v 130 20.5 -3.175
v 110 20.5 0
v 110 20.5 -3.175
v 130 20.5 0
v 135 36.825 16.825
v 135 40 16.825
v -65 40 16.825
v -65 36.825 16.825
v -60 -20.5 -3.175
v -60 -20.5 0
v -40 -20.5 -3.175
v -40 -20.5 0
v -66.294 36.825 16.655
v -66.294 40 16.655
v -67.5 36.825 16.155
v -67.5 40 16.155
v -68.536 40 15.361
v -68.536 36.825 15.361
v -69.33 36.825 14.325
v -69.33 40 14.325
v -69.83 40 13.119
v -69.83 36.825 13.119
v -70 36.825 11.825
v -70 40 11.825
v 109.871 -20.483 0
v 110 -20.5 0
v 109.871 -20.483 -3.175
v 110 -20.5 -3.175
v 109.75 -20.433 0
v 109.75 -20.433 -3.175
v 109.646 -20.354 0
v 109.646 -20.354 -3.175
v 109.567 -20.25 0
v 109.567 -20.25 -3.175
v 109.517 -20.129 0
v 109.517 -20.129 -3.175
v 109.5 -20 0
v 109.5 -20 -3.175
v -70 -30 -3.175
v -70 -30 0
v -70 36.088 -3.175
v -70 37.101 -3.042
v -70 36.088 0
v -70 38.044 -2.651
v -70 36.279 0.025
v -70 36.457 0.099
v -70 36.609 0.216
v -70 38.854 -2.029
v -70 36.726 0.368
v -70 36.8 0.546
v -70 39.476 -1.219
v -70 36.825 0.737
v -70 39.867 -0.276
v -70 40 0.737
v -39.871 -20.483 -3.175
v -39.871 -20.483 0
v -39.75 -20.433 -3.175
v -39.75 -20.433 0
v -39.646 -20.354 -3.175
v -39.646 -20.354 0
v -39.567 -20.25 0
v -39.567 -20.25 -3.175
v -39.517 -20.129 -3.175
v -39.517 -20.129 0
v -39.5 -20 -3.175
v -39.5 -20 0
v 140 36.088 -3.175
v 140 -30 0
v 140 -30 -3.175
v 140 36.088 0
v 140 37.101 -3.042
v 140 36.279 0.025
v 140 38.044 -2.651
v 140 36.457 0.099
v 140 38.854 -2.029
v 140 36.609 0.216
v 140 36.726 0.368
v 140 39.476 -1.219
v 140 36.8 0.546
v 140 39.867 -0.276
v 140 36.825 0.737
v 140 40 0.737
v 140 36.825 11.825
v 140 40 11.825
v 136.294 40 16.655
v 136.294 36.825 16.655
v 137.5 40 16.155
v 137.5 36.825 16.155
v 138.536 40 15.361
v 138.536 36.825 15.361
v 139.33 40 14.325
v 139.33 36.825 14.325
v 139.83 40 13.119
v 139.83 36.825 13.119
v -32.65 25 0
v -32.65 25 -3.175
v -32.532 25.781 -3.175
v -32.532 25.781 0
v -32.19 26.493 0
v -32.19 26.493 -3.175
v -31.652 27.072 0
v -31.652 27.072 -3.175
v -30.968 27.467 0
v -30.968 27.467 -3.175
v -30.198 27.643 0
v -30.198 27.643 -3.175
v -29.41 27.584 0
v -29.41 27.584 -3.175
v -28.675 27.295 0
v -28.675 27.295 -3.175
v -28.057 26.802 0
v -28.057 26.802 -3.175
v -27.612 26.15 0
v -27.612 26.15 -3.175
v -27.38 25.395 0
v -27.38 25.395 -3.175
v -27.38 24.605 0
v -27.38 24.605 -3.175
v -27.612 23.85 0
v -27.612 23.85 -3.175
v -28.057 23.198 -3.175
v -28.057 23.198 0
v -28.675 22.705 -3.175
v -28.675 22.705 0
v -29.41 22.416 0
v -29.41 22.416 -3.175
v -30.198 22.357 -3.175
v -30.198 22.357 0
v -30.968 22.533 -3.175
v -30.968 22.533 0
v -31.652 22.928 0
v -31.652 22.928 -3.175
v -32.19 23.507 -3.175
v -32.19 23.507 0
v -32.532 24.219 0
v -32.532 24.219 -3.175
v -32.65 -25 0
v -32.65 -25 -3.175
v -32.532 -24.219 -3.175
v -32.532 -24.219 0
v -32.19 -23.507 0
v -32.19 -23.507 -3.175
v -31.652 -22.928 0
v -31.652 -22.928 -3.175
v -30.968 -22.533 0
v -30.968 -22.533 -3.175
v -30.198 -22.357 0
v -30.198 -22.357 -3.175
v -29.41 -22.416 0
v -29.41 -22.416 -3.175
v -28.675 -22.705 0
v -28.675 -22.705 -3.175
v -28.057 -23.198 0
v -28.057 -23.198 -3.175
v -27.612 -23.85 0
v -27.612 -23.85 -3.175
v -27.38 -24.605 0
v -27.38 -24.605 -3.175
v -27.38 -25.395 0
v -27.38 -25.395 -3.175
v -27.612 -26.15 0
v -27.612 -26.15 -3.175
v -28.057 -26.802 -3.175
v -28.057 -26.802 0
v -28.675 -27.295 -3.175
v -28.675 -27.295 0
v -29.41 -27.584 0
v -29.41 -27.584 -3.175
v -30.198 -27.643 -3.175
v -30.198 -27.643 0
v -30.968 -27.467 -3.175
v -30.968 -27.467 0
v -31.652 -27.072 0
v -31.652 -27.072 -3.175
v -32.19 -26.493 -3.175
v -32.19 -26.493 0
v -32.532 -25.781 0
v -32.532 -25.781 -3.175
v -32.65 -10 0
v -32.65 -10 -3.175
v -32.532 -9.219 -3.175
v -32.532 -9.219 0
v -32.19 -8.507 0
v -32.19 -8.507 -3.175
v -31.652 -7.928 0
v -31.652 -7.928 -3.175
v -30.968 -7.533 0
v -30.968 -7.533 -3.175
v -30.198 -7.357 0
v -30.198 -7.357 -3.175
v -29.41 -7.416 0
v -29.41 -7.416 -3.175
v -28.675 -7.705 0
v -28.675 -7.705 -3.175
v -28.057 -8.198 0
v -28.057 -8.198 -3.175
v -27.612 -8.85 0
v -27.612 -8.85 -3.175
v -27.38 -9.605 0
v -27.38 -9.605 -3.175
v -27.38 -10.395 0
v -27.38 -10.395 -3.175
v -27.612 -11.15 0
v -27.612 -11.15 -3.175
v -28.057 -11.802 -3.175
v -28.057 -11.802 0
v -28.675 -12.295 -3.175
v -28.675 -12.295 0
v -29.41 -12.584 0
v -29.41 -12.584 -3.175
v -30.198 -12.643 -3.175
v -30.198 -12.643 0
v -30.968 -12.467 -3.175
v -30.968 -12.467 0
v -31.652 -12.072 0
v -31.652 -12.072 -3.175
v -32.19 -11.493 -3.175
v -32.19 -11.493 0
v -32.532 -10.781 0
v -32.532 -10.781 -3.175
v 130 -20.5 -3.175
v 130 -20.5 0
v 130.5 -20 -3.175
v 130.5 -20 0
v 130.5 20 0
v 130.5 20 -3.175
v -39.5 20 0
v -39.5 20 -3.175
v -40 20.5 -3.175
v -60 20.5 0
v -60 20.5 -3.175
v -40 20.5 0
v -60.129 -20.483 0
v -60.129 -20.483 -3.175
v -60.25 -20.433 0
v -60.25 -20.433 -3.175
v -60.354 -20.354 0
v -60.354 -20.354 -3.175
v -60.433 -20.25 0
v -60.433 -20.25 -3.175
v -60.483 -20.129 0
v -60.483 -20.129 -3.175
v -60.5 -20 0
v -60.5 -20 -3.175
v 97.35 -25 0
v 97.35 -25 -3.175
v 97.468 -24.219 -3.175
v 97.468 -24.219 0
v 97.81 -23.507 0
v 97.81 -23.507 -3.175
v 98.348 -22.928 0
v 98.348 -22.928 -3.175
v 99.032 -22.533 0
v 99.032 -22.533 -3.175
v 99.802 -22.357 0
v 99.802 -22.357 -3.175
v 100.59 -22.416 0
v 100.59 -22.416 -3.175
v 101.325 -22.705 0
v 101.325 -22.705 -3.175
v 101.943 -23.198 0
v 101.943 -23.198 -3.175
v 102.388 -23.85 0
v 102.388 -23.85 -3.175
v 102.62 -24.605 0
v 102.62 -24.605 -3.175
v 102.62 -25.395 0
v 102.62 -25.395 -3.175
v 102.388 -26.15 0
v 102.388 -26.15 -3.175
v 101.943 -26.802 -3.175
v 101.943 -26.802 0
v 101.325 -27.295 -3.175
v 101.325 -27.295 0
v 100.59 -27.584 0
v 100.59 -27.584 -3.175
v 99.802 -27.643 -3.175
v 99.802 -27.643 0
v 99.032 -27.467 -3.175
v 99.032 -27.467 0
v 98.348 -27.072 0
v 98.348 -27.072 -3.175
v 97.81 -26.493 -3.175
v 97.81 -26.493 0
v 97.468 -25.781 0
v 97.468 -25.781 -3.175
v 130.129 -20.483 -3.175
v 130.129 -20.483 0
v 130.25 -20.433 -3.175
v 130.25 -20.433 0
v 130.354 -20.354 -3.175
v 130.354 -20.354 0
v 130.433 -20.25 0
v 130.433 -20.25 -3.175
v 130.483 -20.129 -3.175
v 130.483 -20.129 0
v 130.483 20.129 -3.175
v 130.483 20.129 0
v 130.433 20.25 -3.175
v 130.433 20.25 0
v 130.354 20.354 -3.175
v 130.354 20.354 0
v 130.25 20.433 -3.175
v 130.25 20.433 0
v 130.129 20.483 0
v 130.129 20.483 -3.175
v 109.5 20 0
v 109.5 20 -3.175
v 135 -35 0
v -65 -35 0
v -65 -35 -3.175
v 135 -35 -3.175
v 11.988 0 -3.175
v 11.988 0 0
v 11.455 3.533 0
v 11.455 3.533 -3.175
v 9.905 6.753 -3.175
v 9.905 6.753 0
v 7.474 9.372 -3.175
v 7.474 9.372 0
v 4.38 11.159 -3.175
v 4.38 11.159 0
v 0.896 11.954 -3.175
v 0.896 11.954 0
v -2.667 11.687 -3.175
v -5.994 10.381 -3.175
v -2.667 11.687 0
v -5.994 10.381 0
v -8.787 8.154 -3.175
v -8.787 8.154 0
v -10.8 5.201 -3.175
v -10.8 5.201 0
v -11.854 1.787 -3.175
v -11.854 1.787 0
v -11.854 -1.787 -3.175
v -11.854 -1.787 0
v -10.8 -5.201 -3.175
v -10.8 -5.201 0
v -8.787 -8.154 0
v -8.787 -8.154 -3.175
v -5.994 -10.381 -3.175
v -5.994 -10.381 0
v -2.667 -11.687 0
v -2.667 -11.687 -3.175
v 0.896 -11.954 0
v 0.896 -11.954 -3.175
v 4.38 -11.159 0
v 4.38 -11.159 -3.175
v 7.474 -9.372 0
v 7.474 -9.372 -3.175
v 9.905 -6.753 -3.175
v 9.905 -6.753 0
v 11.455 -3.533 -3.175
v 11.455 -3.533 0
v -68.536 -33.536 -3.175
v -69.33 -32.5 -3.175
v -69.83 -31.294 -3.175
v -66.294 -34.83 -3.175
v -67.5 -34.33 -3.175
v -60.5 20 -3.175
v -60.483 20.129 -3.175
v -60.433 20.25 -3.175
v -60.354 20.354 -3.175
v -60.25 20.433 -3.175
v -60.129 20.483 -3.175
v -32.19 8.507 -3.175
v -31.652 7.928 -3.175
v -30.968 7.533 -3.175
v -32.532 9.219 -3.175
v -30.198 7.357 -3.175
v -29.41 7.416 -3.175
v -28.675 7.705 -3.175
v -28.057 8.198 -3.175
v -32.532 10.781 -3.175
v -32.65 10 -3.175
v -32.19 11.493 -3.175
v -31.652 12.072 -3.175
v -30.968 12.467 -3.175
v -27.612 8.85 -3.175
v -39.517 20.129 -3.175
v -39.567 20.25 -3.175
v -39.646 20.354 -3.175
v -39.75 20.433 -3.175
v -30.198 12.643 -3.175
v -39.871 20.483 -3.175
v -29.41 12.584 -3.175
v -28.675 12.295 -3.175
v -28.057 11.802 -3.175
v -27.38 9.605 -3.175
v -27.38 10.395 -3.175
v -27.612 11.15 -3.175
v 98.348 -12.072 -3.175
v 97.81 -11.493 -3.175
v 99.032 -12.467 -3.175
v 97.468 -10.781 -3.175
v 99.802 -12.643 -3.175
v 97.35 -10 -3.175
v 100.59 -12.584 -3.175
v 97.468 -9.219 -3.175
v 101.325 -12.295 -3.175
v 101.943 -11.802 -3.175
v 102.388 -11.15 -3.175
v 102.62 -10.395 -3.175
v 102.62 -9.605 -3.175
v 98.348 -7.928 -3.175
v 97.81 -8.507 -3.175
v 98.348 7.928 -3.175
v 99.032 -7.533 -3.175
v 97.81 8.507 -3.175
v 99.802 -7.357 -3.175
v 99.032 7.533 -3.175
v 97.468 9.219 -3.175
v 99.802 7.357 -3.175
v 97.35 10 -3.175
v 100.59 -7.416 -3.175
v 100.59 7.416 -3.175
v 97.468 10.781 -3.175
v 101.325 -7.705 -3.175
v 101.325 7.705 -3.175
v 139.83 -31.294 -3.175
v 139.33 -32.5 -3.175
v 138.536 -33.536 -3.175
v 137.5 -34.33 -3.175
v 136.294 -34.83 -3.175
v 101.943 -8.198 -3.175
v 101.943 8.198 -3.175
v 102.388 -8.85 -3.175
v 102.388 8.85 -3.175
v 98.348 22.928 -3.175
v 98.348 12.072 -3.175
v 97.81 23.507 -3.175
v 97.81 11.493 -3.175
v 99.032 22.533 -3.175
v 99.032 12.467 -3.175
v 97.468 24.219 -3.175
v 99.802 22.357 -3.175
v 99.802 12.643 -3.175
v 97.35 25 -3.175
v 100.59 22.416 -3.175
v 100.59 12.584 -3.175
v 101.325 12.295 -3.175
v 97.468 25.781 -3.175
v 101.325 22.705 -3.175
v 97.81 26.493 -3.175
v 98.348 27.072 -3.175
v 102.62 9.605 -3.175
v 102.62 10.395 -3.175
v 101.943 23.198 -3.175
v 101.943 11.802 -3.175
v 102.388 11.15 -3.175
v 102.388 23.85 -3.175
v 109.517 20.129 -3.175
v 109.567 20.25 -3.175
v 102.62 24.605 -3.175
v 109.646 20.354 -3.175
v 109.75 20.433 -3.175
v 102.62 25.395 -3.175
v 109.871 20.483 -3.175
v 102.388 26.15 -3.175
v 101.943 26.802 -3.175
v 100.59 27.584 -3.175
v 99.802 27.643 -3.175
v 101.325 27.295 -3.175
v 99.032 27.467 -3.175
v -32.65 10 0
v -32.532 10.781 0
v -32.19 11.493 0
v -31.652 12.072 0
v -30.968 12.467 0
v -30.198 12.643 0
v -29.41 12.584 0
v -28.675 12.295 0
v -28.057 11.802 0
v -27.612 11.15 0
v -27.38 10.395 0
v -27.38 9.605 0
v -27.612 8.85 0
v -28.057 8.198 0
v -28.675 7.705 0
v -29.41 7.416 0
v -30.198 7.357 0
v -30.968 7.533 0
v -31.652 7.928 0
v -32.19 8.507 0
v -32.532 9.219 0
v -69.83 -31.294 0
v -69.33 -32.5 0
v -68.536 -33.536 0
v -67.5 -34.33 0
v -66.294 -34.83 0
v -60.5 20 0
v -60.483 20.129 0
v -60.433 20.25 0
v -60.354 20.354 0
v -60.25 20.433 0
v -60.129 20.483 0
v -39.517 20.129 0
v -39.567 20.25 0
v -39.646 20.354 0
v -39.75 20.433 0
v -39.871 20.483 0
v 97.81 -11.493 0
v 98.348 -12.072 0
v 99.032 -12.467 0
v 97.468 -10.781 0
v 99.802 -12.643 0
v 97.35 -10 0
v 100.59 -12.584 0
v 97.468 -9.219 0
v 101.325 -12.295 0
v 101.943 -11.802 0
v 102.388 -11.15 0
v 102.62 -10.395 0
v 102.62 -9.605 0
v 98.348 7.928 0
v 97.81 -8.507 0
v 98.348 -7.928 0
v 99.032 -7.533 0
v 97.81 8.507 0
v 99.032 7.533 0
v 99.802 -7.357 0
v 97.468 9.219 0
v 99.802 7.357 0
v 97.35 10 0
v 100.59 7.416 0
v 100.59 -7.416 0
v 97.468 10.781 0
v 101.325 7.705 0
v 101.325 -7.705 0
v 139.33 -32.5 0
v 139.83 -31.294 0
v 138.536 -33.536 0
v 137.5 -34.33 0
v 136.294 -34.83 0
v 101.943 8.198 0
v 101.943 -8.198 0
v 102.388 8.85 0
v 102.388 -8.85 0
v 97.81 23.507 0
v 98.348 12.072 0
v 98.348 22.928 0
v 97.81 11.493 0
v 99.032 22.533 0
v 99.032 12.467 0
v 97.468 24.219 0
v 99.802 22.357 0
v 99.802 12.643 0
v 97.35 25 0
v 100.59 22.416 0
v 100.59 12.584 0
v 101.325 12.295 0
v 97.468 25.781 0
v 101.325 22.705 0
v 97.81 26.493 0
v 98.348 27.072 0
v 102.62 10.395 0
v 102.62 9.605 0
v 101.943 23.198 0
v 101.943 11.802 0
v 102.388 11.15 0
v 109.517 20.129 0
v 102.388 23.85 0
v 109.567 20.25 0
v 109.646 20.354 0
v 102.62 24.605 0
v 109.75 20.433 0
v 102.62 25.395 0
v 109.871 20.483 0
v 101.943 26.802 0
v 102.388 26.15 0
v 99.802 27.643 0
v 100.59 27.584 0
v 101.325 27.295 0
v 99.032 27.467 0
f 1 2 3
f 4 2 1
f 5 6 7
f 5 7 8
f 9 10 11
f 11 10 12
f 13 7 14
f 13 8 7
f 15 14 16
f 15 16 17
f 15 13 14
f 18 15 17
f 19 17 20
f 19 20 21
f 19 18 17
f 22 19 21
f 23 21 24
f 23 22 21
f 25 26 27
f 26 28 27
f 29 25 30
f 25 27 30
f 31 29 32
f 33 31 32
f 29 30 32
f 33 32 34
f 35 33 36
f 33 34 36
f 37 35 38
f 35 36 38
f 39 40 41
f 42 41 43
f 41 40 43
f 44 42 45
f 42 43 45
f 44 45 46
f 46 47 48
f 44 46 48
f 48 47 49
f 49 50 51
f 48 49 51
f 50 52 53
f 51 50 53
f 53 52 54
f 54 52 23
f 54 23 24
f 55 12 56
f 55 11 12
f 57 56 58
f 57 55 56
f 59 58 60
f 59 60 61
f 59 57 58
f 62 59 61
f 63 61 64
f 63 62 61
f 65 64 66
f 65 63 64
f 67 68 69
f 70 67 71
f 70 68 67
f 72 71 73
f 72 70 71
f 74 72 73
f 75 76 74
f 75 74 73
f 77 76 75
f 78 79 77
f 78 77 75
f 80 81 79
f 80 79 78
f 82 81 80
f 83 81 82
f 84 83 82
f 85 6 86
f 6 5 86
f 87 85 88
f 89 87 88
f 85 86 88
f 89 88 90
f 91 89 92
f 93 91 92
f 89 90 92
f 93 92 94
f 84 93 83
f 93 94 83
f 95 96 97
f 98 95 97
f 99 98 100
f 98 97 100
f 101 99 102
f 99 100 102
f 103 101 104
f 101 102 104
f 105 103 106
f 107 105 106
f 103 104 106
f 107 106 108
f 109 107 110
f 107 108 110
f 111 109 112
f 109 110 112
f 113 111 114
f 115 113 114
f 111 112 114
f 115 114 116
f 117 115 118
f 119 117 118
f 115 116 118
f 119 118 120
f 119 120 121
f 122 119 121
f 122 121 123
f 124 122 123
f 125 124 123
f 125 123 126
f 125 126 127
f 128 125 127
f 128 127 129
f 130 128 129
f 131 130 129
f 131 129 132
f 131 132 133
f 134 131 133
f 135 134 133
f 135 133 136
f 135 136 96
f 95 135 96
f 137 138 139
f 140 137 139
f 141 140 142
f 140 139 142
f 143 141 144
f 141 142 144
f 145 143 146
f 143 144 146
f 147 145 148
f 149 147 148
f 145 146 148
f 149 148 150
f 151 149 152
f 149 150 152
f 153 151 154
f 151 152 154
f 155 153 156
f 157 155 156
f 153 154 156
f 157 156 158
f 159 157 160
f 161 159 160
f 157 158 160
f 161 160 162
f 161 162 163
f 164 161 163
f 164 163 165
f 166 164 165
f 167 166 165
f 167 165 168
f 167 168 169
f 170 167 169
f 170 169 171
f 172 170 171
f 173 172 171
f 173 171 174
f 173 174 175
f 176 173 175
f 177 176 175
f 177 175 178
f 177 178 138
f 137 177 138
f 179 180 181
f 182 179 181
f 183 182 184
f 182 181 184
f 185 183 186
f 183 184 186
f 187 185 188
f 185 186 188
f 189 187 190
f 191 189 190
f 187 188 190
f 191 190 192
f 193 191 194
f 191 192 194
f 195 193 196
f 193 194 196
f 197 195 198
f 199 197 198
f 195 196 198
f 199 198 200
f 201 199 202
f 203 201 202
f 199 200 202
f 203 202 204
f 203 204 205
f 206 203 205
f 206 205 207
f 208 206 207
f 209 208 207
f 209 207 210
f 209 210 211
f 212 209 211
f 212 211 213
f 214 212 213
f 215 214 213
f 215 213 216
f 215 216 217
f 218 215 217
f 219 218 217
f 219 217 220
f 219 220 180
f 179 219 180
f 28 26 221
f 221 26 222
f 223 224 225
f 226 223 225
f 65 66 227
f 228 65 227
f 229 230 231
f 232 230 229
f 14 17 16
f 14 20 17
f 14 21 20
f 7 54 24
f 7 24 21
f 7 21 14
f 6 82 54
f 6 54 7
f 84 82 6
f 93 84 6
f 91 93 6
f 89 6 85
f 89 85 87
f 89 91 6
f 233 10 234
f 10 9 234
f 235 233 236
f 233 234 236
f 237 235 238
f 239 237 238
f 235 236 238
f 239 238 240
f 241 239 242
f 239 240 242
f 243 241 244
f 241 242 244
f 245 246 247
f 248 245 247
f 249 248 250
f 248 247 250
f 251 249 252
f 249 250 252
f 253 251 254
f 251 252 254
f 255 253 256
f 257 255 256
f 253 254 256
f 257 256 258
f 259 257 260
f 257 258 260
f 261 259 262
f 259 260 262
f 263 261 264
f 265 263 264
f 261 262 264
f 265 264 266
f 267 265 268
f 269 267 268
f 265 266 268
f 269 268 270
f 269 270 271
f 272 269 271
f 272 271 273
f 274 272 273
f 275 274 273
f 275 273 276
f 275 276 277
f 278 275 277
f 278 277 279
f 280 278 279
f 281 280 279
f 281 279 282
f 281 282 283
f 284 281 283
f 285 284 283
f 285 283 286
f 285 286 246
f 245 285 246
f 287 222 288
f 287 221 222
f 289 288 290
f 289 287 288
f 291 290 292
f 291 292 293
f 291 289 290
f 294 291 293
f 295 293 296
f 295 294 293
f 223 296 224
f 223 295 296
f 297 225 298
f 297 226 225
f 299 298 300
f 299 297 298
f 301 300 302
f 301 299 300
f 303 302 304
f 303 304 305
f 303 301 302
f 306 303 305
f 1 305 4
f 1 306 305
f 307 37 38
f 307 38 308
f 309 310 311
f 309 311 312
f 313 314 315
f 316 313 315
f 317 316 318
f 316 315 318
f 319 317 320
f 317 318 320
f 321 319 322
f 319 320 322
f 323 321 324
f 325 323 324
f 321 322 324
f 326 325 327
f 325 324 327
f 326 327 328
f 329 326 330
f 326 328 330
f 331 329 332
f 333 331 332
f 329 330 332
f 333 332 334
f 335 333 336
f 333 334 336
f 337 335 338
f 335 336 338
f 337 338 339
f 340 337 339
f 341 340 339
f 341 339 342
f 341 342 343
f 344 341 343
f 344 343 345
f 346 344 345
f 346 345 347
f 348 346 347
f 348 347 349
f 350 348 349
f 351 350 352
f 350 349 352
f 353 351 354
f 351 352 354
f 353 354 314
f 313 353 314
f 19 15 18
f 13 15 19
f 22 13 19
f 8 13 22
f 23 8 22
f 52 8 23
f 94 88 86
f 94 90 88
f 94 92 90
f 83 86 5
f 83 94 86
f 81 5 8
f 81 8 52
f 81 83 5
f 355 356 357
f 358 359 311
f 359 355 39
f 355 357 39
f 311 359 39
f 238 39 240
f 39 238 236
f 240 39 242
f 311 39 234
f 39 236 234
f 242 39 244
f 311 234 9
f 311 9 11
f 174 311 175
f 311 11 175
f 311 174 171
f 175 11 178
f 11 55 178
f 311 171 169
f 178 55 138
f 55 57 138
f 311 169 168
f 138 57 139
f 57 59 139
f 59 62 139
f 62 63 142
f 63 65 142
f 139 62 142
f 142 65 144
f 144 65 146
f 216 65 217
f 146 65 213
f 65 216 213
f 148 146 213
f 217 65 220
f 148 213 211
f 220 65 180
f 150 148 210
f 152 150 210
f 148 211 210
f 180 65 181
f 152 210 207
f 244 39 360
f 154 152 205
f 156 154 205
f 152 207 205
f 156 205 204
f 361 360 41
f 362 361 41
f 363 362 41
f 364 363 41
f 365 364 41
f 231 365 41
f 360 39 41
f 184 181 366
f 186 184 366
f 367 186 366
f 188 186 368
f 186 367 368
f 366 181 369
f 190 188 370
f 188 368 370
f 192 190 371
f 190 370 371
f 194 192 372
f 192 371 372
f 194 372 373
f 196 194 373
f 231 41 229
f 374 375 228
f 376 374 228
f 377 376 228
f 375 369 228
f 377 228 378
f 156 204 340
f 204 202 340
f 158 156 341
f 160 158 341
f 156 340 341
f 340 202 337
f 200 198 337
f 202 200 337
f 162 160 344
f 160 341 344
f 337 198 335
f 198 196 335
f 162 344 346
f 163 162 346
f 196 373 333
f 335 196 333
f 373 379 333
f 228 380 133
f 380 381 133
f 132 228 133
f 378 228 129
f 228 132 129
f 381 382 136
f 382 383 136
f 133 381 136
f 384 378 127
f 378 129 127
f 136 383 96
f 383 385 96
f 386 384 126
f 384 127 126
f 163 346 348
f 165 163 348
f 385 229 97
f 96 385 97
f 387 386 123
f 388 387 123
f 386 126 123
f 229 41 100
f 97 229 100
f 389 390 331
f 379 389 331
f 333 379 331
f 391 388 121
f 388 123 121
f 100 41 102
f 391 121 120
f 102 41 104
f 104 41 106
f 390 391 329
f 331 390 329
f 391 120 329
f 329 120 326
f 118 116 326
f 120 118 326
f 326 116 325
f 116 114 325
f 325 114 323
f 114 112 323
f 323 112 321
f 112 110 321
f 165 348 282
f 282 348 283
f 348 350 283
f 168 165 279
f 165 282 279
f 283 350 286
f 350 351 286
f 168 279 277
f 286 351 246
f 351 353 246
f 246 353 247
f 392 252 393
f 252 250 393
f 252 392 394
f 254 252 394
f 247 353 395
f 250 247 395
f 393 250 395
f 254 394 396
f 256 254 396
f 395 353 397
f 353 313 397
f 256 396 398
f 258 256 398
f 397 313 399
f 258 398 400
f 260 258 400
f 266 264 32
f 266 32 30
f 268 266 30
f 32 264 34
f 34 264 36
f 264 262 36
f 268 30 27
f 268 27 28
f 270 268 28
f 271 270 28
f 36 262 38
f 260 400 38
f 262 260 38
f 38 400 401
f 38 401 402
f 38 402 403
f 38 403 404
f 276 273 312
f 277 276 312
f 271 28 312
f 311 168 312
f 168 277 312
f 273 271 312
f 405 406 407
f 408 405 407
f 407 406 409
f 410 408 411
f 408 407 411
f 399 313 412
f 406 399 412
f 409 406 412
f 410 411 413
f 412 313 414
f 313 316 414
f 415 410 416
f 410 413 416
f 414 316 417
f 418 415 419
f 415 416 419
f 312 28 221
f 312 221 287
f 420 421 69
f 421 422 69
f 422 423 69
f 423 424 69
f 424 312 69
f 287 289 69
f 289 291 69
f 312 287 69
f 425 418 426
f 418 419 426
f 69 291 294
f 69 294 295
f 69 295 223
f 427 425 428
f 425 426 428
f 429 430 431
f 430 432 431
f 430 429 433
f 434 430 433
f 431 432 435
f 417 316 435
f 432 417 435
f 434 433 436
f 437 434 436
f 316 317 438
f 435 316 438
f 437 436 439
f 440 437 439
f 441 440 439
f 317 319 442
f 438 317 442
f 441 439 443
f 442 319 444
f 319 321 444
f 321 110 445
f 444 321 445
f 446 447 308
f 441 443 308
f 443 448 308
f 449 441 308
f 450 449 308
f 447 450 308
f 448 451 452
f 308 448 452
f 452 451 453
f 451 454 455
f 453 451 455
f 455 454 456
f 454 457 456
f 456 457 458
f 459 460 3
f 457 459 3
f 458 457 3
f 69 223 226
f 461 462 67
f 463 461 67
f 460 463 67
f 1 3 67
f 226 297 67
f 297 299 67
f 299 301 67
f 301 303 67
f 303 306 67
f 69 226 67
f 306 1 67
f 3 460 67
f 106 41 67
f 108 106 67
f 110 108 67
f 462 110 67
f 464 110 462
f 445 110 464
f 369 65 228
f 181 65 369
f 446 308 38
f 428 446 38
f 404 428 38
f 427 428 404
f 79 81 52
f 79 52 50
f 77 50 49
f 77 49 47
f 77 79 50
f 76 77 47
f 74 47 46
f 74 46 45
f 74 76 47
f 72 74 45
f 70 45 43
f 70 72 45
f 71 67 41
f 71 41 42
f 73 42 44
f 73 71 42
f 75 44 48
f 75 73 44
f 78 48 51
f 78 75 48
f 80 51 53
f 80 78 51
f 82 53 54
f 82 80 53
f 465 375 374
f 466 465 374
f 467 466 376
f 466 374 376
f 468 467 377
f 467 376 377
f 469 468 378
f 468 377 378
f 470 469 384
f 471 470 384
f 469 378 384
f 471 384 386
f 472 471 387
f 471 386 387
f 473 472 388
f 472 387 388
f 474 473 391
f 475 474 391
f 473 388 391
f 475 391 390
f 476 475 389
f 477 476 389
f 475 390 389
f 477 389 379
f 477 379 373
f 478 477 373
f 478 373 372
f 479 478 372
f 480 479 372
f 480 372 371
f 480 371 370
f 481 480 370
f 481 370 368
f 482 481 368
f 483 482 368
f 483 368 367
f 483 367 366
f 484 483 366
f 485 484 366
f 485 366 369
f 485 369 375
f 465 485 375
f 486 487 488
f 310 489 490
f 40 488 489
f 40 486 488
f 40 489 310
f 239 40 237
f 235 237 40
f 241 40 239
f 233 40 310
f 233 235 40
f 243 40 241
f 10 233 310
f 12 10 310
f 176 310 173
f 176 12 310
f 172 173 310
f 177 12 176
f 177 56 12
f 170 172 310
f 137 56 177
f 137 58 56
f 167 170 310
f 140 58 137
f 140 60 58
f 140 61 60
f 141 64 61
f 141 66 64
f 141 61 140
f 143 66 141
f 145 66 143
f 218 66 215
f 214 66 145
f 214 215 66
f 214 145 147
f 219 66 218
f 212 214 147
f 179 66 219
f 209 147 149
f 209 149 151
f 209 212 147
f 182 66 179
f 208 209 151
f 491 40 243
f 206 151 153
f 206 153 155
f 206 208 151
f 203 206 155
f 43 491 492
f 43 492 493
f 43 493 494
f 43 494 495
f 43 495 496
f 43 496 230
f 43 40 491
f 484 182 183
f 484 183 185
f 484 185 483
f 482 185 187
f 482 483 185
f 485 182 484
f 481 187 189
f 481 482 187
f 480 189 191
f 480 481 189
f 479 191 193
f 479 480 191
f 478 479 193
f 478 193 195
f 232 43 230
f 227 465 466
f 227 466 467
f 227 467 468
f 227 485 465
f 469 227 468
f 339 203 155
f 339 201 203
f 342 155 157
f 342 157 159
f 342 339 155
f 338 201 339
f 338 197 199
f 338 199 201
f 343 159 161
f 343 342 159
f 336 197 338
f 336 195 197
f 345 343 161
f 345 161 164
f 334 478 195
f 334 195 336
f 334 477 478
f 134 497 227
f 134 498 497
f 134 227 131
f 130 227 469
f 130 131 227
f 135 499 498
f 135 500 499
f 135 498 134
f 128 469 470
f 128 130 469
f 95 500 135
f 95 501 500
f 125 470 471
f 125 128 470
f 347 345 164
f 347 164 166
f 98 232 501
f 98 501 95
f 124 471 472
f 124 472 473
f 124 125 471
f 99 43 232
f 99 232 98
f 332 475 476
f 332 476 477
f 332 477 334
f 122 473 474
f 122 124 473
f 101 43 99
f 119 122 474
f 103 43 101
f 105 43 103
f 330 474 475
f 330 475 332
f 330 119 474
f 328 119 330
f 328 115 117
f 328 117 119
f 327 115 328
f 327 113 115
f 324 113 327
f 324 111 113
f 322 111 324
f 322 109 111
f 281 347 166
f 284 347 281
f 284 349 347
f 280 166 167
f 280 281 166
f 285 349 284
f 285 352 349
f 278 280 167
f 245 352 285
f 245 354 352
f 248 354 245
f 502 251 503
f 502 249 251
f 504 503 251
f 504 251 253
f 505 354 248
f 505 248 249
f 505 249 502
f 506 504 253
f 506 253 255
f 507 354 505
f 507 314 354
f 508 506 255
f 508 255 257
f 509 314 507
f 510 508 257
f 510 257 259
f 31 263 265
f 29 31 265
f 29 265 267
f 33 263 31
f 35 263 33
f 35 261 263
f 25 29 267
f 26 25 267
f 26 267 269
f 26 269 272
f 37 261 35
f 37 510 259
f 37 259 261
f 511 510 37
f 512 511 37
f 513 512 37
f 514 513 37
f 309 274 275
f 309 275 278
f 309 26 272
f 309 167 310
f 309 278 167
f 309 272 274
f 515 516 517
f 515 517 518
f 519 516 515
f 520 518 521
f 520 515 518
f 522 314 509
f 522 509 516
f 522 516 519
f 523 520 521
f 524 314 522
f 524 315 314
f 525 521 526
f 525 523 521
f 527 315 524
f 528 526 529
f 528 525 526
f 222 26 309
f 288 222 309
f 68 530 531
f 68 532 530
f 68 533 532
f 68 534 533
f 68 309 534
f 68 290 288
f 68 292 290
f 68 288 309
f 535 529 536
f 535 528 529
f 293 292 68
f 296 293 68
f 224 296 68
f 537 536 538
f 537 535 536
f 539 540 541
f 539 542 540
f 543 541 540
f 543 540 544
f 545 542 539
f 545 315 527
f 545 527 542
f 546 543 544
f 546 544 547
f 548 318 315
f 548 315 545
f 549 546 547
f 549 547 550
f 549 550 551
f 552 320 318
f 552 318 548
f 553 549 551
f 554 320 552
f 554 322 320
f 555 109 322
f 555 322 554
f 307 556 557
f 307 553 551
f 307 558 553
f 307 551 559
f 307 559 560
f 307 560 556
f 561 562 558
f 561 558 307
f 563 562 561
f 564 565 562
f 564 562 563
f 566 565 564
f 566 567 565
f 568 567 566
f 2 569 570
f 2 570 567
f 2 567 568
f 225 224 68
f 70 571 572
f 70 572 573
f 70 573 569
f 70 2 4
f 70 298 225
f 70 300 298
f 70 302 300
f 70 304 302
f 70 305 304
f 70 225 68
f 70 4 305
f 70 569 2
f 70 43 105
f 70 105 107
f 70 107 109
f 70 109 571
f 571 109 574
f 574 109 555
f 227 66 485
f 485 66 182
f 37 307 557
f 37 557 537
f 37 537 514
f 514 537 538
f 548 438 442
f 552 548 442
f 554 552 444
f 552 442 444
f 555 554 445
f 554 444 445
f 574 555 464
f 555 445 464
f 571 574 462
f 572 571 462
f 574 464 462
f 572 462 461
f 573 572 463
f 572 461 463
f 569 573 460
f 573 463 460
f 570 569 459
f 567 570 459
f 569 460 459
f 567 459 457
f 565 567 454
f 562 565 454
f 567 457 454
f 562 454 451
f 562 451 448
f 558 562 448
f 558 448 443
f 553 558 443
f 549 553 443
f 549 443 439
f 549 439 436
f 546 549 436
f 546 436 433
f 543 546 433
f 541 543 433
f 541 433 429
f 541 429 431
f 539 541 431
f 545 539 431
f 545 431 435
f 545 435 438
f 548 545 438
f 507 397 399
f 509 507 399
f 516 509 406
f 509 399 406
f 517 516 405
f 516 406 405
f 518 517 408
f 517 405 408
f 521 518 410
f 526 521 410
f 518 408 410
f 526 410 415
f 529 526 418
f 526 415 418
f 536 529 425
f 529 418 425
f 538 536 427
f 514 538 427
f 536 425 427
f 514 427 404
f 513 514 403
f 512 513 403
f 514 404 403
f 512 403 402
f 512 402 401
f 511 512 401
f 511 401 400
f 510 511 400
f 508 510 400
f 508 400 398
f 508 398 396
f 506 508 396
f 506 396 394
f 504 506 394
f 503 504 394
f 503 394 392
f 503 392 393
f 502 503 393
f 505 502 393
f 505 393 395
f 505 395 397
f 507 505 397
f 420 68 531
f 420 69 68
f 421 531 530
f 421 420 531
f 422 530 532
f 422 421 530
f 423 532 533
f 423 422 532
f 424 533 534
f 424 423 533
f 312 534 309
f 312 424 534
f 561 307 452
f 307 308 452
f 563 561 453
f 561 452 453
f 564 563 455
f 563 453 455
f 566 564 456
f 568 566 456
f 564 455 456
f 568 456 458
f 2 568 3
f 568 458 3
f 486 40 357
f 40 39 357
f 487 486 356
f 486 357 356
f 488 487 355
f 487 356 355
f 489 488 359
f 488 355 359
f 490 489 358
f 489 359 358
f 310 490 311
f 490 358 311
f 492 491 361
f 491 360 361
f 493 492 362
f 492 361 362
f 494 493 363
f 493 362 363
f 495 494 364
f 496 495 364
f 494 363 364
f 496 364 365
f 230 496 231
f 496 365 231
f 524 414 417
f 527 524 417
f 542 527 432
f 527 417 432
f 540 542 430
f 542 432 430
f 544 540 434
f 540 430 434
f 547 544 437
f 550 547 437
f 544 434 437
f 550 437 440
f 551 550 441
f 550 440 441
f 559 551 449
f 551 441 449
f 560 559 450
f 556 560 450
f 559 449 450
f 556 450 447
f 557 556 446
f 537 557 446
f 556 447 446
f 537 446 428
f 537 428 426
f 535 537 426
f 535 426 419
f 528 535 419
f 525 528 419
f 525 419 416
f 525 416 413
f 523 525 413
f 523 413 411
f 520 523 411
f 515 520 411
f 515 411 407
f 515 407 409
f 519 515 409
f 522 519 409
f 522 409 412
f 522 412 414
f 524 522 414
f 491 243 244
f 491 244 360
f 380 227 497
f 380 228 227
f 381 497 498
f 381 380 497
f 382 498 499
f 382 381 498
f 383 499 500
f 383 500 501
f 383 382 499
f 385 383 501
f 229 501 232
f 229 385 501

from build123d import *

# Parameters (mm, degrees)
SKETCH1_W                    = 210
SKETCH1_H                    = 75
SKETCH1_R                    = 11.9875
SKETCH1_W_2                  = 21
SKETCH1_H_2                  = 41
BASE_FLANGE1_DEPTH           = 3.175
EDGE_FLANGE1_STRIP_W         = 14.1732
EDGE_FLANGE1_STRIP_H         = 3.175
EDGE_FLANGE1_STRIP_CUT_DEPTH = 210
EDGE_FLANGE1_DEPTH           = 210
M5_CLEARANCE_HOLE1_D         = 5.3
FILLET1_R                    = 5
FILLET2_R                    = 0.5


# Sheet-metal steps are written as plain solids
with BuildPart() as part:
    # Sketch1 → Base-Flange1 (new body)
    with BuildSketch(Plane.XY):
        with Locations((35, 2.5)):
            Rectangle(SKETCH1_W, SKETCH1_H)
        Circle(SKETCH1_R, mode=Mode.SUBTRACT)
        with Locations((-50, 0)):
            Rectangle(SKETCH1_W_2, SKETCH1_H_2, mode=Mode.SUBTRACT)
        with Locations((120, 0)):
            Rectangle(SKETCH1_W_2, SKETCH1_H_2, mode=Mode.SUBTRACT)
    extrude(amount=-BASE_FLANGE1_DEPTH)

    # Edge-Flange1 strip (across the edge) → Edge-Flange1 strip cut (cut)
    with BuildSketch(Plane(origin=(140, 40, 0), x_dir=(0, -1, 0), z_dir=(-1, 0, 0))):
        with Locations((-3.175, -1.5875)):
            Rectangle(EDGE_FLANGE1_STRIP_W, EDGE_FLANGE1_STRIP_H)
    extrude(amount=EDGE_FLANGE1_STRIP_CUT_DEPTH, mode=Mode.SUBTRACT)

    # Edge-Flange1 section (across the edge) → Edge-Flange1 (add)
    with BuildSketch(Plane(origin=(140, 40, 0), x_dir=(0, -1, 0), z_dir=(-1, 0, 0))):
        with BuildLine():
            Line((0, 0.7366), (0, 16.825))
            Line((0, 16.825), (3.175, 16.825))
            Line((3.175, 16.825), (3.175, 0.7366))
            ThreePointArc((3.175, 0.7366), (3.390745145, 0.215745145), (3.9116, 0))
            Line((3.9116, 0), (3.9116, -3.175))
            ThreePointArc((3.9116, -3.175), (1.145681115, -2.029318885), (0, 0.7366))
        make_face()
    extrude(amount=EDGE_FLANGE1_DEPTH)

    # M5 Clearance Hole1 (through all)
    with Locations(Plane(origin=(-30, 25, 0), x_dir=(1, 0, 0), z_dir=(0, 0, 1))):
        with Locations((0, 0), (0, -50), (130, -50), (130, 0), (0, -15), (0, -35), (130, -35), (130, -15)):
            Hole(M5_CLEARANCE_HOLE1_D / 2)

    # Fillet1
    fillet1_edges = [part.edges().sort_by_distance(p)[0] for p in [
        (140, 38.4125, 16.825),
        (-70, 38.4125, 16.825),
        (140, -35, -1.5875),
        (-70, -35, -1.5875),
    ]]
    fillet(fillet1_edges, radius=FILLET1_R)

    # Fillet2
    fillet2_edges = [part.edges().sort_by_distance(p)[0] for p in [
        (-60.5, -20.5, -1.5875),
        (-60.5, 20.5, -1.5875),
        (-39.5, 20.5, -1.5875),
        (-39.5, -20.5, -1.5875),
        (109.5, -20.5, -1.5875),
        (109.5, 20.5, -1.5875),
        (130.5, 20.5, -1.5875),
        (130.5, -20.5, -1.5875),
    ]]
    fillet(fillet2_edges, radius=FILLET2_R)


solid = part.part
